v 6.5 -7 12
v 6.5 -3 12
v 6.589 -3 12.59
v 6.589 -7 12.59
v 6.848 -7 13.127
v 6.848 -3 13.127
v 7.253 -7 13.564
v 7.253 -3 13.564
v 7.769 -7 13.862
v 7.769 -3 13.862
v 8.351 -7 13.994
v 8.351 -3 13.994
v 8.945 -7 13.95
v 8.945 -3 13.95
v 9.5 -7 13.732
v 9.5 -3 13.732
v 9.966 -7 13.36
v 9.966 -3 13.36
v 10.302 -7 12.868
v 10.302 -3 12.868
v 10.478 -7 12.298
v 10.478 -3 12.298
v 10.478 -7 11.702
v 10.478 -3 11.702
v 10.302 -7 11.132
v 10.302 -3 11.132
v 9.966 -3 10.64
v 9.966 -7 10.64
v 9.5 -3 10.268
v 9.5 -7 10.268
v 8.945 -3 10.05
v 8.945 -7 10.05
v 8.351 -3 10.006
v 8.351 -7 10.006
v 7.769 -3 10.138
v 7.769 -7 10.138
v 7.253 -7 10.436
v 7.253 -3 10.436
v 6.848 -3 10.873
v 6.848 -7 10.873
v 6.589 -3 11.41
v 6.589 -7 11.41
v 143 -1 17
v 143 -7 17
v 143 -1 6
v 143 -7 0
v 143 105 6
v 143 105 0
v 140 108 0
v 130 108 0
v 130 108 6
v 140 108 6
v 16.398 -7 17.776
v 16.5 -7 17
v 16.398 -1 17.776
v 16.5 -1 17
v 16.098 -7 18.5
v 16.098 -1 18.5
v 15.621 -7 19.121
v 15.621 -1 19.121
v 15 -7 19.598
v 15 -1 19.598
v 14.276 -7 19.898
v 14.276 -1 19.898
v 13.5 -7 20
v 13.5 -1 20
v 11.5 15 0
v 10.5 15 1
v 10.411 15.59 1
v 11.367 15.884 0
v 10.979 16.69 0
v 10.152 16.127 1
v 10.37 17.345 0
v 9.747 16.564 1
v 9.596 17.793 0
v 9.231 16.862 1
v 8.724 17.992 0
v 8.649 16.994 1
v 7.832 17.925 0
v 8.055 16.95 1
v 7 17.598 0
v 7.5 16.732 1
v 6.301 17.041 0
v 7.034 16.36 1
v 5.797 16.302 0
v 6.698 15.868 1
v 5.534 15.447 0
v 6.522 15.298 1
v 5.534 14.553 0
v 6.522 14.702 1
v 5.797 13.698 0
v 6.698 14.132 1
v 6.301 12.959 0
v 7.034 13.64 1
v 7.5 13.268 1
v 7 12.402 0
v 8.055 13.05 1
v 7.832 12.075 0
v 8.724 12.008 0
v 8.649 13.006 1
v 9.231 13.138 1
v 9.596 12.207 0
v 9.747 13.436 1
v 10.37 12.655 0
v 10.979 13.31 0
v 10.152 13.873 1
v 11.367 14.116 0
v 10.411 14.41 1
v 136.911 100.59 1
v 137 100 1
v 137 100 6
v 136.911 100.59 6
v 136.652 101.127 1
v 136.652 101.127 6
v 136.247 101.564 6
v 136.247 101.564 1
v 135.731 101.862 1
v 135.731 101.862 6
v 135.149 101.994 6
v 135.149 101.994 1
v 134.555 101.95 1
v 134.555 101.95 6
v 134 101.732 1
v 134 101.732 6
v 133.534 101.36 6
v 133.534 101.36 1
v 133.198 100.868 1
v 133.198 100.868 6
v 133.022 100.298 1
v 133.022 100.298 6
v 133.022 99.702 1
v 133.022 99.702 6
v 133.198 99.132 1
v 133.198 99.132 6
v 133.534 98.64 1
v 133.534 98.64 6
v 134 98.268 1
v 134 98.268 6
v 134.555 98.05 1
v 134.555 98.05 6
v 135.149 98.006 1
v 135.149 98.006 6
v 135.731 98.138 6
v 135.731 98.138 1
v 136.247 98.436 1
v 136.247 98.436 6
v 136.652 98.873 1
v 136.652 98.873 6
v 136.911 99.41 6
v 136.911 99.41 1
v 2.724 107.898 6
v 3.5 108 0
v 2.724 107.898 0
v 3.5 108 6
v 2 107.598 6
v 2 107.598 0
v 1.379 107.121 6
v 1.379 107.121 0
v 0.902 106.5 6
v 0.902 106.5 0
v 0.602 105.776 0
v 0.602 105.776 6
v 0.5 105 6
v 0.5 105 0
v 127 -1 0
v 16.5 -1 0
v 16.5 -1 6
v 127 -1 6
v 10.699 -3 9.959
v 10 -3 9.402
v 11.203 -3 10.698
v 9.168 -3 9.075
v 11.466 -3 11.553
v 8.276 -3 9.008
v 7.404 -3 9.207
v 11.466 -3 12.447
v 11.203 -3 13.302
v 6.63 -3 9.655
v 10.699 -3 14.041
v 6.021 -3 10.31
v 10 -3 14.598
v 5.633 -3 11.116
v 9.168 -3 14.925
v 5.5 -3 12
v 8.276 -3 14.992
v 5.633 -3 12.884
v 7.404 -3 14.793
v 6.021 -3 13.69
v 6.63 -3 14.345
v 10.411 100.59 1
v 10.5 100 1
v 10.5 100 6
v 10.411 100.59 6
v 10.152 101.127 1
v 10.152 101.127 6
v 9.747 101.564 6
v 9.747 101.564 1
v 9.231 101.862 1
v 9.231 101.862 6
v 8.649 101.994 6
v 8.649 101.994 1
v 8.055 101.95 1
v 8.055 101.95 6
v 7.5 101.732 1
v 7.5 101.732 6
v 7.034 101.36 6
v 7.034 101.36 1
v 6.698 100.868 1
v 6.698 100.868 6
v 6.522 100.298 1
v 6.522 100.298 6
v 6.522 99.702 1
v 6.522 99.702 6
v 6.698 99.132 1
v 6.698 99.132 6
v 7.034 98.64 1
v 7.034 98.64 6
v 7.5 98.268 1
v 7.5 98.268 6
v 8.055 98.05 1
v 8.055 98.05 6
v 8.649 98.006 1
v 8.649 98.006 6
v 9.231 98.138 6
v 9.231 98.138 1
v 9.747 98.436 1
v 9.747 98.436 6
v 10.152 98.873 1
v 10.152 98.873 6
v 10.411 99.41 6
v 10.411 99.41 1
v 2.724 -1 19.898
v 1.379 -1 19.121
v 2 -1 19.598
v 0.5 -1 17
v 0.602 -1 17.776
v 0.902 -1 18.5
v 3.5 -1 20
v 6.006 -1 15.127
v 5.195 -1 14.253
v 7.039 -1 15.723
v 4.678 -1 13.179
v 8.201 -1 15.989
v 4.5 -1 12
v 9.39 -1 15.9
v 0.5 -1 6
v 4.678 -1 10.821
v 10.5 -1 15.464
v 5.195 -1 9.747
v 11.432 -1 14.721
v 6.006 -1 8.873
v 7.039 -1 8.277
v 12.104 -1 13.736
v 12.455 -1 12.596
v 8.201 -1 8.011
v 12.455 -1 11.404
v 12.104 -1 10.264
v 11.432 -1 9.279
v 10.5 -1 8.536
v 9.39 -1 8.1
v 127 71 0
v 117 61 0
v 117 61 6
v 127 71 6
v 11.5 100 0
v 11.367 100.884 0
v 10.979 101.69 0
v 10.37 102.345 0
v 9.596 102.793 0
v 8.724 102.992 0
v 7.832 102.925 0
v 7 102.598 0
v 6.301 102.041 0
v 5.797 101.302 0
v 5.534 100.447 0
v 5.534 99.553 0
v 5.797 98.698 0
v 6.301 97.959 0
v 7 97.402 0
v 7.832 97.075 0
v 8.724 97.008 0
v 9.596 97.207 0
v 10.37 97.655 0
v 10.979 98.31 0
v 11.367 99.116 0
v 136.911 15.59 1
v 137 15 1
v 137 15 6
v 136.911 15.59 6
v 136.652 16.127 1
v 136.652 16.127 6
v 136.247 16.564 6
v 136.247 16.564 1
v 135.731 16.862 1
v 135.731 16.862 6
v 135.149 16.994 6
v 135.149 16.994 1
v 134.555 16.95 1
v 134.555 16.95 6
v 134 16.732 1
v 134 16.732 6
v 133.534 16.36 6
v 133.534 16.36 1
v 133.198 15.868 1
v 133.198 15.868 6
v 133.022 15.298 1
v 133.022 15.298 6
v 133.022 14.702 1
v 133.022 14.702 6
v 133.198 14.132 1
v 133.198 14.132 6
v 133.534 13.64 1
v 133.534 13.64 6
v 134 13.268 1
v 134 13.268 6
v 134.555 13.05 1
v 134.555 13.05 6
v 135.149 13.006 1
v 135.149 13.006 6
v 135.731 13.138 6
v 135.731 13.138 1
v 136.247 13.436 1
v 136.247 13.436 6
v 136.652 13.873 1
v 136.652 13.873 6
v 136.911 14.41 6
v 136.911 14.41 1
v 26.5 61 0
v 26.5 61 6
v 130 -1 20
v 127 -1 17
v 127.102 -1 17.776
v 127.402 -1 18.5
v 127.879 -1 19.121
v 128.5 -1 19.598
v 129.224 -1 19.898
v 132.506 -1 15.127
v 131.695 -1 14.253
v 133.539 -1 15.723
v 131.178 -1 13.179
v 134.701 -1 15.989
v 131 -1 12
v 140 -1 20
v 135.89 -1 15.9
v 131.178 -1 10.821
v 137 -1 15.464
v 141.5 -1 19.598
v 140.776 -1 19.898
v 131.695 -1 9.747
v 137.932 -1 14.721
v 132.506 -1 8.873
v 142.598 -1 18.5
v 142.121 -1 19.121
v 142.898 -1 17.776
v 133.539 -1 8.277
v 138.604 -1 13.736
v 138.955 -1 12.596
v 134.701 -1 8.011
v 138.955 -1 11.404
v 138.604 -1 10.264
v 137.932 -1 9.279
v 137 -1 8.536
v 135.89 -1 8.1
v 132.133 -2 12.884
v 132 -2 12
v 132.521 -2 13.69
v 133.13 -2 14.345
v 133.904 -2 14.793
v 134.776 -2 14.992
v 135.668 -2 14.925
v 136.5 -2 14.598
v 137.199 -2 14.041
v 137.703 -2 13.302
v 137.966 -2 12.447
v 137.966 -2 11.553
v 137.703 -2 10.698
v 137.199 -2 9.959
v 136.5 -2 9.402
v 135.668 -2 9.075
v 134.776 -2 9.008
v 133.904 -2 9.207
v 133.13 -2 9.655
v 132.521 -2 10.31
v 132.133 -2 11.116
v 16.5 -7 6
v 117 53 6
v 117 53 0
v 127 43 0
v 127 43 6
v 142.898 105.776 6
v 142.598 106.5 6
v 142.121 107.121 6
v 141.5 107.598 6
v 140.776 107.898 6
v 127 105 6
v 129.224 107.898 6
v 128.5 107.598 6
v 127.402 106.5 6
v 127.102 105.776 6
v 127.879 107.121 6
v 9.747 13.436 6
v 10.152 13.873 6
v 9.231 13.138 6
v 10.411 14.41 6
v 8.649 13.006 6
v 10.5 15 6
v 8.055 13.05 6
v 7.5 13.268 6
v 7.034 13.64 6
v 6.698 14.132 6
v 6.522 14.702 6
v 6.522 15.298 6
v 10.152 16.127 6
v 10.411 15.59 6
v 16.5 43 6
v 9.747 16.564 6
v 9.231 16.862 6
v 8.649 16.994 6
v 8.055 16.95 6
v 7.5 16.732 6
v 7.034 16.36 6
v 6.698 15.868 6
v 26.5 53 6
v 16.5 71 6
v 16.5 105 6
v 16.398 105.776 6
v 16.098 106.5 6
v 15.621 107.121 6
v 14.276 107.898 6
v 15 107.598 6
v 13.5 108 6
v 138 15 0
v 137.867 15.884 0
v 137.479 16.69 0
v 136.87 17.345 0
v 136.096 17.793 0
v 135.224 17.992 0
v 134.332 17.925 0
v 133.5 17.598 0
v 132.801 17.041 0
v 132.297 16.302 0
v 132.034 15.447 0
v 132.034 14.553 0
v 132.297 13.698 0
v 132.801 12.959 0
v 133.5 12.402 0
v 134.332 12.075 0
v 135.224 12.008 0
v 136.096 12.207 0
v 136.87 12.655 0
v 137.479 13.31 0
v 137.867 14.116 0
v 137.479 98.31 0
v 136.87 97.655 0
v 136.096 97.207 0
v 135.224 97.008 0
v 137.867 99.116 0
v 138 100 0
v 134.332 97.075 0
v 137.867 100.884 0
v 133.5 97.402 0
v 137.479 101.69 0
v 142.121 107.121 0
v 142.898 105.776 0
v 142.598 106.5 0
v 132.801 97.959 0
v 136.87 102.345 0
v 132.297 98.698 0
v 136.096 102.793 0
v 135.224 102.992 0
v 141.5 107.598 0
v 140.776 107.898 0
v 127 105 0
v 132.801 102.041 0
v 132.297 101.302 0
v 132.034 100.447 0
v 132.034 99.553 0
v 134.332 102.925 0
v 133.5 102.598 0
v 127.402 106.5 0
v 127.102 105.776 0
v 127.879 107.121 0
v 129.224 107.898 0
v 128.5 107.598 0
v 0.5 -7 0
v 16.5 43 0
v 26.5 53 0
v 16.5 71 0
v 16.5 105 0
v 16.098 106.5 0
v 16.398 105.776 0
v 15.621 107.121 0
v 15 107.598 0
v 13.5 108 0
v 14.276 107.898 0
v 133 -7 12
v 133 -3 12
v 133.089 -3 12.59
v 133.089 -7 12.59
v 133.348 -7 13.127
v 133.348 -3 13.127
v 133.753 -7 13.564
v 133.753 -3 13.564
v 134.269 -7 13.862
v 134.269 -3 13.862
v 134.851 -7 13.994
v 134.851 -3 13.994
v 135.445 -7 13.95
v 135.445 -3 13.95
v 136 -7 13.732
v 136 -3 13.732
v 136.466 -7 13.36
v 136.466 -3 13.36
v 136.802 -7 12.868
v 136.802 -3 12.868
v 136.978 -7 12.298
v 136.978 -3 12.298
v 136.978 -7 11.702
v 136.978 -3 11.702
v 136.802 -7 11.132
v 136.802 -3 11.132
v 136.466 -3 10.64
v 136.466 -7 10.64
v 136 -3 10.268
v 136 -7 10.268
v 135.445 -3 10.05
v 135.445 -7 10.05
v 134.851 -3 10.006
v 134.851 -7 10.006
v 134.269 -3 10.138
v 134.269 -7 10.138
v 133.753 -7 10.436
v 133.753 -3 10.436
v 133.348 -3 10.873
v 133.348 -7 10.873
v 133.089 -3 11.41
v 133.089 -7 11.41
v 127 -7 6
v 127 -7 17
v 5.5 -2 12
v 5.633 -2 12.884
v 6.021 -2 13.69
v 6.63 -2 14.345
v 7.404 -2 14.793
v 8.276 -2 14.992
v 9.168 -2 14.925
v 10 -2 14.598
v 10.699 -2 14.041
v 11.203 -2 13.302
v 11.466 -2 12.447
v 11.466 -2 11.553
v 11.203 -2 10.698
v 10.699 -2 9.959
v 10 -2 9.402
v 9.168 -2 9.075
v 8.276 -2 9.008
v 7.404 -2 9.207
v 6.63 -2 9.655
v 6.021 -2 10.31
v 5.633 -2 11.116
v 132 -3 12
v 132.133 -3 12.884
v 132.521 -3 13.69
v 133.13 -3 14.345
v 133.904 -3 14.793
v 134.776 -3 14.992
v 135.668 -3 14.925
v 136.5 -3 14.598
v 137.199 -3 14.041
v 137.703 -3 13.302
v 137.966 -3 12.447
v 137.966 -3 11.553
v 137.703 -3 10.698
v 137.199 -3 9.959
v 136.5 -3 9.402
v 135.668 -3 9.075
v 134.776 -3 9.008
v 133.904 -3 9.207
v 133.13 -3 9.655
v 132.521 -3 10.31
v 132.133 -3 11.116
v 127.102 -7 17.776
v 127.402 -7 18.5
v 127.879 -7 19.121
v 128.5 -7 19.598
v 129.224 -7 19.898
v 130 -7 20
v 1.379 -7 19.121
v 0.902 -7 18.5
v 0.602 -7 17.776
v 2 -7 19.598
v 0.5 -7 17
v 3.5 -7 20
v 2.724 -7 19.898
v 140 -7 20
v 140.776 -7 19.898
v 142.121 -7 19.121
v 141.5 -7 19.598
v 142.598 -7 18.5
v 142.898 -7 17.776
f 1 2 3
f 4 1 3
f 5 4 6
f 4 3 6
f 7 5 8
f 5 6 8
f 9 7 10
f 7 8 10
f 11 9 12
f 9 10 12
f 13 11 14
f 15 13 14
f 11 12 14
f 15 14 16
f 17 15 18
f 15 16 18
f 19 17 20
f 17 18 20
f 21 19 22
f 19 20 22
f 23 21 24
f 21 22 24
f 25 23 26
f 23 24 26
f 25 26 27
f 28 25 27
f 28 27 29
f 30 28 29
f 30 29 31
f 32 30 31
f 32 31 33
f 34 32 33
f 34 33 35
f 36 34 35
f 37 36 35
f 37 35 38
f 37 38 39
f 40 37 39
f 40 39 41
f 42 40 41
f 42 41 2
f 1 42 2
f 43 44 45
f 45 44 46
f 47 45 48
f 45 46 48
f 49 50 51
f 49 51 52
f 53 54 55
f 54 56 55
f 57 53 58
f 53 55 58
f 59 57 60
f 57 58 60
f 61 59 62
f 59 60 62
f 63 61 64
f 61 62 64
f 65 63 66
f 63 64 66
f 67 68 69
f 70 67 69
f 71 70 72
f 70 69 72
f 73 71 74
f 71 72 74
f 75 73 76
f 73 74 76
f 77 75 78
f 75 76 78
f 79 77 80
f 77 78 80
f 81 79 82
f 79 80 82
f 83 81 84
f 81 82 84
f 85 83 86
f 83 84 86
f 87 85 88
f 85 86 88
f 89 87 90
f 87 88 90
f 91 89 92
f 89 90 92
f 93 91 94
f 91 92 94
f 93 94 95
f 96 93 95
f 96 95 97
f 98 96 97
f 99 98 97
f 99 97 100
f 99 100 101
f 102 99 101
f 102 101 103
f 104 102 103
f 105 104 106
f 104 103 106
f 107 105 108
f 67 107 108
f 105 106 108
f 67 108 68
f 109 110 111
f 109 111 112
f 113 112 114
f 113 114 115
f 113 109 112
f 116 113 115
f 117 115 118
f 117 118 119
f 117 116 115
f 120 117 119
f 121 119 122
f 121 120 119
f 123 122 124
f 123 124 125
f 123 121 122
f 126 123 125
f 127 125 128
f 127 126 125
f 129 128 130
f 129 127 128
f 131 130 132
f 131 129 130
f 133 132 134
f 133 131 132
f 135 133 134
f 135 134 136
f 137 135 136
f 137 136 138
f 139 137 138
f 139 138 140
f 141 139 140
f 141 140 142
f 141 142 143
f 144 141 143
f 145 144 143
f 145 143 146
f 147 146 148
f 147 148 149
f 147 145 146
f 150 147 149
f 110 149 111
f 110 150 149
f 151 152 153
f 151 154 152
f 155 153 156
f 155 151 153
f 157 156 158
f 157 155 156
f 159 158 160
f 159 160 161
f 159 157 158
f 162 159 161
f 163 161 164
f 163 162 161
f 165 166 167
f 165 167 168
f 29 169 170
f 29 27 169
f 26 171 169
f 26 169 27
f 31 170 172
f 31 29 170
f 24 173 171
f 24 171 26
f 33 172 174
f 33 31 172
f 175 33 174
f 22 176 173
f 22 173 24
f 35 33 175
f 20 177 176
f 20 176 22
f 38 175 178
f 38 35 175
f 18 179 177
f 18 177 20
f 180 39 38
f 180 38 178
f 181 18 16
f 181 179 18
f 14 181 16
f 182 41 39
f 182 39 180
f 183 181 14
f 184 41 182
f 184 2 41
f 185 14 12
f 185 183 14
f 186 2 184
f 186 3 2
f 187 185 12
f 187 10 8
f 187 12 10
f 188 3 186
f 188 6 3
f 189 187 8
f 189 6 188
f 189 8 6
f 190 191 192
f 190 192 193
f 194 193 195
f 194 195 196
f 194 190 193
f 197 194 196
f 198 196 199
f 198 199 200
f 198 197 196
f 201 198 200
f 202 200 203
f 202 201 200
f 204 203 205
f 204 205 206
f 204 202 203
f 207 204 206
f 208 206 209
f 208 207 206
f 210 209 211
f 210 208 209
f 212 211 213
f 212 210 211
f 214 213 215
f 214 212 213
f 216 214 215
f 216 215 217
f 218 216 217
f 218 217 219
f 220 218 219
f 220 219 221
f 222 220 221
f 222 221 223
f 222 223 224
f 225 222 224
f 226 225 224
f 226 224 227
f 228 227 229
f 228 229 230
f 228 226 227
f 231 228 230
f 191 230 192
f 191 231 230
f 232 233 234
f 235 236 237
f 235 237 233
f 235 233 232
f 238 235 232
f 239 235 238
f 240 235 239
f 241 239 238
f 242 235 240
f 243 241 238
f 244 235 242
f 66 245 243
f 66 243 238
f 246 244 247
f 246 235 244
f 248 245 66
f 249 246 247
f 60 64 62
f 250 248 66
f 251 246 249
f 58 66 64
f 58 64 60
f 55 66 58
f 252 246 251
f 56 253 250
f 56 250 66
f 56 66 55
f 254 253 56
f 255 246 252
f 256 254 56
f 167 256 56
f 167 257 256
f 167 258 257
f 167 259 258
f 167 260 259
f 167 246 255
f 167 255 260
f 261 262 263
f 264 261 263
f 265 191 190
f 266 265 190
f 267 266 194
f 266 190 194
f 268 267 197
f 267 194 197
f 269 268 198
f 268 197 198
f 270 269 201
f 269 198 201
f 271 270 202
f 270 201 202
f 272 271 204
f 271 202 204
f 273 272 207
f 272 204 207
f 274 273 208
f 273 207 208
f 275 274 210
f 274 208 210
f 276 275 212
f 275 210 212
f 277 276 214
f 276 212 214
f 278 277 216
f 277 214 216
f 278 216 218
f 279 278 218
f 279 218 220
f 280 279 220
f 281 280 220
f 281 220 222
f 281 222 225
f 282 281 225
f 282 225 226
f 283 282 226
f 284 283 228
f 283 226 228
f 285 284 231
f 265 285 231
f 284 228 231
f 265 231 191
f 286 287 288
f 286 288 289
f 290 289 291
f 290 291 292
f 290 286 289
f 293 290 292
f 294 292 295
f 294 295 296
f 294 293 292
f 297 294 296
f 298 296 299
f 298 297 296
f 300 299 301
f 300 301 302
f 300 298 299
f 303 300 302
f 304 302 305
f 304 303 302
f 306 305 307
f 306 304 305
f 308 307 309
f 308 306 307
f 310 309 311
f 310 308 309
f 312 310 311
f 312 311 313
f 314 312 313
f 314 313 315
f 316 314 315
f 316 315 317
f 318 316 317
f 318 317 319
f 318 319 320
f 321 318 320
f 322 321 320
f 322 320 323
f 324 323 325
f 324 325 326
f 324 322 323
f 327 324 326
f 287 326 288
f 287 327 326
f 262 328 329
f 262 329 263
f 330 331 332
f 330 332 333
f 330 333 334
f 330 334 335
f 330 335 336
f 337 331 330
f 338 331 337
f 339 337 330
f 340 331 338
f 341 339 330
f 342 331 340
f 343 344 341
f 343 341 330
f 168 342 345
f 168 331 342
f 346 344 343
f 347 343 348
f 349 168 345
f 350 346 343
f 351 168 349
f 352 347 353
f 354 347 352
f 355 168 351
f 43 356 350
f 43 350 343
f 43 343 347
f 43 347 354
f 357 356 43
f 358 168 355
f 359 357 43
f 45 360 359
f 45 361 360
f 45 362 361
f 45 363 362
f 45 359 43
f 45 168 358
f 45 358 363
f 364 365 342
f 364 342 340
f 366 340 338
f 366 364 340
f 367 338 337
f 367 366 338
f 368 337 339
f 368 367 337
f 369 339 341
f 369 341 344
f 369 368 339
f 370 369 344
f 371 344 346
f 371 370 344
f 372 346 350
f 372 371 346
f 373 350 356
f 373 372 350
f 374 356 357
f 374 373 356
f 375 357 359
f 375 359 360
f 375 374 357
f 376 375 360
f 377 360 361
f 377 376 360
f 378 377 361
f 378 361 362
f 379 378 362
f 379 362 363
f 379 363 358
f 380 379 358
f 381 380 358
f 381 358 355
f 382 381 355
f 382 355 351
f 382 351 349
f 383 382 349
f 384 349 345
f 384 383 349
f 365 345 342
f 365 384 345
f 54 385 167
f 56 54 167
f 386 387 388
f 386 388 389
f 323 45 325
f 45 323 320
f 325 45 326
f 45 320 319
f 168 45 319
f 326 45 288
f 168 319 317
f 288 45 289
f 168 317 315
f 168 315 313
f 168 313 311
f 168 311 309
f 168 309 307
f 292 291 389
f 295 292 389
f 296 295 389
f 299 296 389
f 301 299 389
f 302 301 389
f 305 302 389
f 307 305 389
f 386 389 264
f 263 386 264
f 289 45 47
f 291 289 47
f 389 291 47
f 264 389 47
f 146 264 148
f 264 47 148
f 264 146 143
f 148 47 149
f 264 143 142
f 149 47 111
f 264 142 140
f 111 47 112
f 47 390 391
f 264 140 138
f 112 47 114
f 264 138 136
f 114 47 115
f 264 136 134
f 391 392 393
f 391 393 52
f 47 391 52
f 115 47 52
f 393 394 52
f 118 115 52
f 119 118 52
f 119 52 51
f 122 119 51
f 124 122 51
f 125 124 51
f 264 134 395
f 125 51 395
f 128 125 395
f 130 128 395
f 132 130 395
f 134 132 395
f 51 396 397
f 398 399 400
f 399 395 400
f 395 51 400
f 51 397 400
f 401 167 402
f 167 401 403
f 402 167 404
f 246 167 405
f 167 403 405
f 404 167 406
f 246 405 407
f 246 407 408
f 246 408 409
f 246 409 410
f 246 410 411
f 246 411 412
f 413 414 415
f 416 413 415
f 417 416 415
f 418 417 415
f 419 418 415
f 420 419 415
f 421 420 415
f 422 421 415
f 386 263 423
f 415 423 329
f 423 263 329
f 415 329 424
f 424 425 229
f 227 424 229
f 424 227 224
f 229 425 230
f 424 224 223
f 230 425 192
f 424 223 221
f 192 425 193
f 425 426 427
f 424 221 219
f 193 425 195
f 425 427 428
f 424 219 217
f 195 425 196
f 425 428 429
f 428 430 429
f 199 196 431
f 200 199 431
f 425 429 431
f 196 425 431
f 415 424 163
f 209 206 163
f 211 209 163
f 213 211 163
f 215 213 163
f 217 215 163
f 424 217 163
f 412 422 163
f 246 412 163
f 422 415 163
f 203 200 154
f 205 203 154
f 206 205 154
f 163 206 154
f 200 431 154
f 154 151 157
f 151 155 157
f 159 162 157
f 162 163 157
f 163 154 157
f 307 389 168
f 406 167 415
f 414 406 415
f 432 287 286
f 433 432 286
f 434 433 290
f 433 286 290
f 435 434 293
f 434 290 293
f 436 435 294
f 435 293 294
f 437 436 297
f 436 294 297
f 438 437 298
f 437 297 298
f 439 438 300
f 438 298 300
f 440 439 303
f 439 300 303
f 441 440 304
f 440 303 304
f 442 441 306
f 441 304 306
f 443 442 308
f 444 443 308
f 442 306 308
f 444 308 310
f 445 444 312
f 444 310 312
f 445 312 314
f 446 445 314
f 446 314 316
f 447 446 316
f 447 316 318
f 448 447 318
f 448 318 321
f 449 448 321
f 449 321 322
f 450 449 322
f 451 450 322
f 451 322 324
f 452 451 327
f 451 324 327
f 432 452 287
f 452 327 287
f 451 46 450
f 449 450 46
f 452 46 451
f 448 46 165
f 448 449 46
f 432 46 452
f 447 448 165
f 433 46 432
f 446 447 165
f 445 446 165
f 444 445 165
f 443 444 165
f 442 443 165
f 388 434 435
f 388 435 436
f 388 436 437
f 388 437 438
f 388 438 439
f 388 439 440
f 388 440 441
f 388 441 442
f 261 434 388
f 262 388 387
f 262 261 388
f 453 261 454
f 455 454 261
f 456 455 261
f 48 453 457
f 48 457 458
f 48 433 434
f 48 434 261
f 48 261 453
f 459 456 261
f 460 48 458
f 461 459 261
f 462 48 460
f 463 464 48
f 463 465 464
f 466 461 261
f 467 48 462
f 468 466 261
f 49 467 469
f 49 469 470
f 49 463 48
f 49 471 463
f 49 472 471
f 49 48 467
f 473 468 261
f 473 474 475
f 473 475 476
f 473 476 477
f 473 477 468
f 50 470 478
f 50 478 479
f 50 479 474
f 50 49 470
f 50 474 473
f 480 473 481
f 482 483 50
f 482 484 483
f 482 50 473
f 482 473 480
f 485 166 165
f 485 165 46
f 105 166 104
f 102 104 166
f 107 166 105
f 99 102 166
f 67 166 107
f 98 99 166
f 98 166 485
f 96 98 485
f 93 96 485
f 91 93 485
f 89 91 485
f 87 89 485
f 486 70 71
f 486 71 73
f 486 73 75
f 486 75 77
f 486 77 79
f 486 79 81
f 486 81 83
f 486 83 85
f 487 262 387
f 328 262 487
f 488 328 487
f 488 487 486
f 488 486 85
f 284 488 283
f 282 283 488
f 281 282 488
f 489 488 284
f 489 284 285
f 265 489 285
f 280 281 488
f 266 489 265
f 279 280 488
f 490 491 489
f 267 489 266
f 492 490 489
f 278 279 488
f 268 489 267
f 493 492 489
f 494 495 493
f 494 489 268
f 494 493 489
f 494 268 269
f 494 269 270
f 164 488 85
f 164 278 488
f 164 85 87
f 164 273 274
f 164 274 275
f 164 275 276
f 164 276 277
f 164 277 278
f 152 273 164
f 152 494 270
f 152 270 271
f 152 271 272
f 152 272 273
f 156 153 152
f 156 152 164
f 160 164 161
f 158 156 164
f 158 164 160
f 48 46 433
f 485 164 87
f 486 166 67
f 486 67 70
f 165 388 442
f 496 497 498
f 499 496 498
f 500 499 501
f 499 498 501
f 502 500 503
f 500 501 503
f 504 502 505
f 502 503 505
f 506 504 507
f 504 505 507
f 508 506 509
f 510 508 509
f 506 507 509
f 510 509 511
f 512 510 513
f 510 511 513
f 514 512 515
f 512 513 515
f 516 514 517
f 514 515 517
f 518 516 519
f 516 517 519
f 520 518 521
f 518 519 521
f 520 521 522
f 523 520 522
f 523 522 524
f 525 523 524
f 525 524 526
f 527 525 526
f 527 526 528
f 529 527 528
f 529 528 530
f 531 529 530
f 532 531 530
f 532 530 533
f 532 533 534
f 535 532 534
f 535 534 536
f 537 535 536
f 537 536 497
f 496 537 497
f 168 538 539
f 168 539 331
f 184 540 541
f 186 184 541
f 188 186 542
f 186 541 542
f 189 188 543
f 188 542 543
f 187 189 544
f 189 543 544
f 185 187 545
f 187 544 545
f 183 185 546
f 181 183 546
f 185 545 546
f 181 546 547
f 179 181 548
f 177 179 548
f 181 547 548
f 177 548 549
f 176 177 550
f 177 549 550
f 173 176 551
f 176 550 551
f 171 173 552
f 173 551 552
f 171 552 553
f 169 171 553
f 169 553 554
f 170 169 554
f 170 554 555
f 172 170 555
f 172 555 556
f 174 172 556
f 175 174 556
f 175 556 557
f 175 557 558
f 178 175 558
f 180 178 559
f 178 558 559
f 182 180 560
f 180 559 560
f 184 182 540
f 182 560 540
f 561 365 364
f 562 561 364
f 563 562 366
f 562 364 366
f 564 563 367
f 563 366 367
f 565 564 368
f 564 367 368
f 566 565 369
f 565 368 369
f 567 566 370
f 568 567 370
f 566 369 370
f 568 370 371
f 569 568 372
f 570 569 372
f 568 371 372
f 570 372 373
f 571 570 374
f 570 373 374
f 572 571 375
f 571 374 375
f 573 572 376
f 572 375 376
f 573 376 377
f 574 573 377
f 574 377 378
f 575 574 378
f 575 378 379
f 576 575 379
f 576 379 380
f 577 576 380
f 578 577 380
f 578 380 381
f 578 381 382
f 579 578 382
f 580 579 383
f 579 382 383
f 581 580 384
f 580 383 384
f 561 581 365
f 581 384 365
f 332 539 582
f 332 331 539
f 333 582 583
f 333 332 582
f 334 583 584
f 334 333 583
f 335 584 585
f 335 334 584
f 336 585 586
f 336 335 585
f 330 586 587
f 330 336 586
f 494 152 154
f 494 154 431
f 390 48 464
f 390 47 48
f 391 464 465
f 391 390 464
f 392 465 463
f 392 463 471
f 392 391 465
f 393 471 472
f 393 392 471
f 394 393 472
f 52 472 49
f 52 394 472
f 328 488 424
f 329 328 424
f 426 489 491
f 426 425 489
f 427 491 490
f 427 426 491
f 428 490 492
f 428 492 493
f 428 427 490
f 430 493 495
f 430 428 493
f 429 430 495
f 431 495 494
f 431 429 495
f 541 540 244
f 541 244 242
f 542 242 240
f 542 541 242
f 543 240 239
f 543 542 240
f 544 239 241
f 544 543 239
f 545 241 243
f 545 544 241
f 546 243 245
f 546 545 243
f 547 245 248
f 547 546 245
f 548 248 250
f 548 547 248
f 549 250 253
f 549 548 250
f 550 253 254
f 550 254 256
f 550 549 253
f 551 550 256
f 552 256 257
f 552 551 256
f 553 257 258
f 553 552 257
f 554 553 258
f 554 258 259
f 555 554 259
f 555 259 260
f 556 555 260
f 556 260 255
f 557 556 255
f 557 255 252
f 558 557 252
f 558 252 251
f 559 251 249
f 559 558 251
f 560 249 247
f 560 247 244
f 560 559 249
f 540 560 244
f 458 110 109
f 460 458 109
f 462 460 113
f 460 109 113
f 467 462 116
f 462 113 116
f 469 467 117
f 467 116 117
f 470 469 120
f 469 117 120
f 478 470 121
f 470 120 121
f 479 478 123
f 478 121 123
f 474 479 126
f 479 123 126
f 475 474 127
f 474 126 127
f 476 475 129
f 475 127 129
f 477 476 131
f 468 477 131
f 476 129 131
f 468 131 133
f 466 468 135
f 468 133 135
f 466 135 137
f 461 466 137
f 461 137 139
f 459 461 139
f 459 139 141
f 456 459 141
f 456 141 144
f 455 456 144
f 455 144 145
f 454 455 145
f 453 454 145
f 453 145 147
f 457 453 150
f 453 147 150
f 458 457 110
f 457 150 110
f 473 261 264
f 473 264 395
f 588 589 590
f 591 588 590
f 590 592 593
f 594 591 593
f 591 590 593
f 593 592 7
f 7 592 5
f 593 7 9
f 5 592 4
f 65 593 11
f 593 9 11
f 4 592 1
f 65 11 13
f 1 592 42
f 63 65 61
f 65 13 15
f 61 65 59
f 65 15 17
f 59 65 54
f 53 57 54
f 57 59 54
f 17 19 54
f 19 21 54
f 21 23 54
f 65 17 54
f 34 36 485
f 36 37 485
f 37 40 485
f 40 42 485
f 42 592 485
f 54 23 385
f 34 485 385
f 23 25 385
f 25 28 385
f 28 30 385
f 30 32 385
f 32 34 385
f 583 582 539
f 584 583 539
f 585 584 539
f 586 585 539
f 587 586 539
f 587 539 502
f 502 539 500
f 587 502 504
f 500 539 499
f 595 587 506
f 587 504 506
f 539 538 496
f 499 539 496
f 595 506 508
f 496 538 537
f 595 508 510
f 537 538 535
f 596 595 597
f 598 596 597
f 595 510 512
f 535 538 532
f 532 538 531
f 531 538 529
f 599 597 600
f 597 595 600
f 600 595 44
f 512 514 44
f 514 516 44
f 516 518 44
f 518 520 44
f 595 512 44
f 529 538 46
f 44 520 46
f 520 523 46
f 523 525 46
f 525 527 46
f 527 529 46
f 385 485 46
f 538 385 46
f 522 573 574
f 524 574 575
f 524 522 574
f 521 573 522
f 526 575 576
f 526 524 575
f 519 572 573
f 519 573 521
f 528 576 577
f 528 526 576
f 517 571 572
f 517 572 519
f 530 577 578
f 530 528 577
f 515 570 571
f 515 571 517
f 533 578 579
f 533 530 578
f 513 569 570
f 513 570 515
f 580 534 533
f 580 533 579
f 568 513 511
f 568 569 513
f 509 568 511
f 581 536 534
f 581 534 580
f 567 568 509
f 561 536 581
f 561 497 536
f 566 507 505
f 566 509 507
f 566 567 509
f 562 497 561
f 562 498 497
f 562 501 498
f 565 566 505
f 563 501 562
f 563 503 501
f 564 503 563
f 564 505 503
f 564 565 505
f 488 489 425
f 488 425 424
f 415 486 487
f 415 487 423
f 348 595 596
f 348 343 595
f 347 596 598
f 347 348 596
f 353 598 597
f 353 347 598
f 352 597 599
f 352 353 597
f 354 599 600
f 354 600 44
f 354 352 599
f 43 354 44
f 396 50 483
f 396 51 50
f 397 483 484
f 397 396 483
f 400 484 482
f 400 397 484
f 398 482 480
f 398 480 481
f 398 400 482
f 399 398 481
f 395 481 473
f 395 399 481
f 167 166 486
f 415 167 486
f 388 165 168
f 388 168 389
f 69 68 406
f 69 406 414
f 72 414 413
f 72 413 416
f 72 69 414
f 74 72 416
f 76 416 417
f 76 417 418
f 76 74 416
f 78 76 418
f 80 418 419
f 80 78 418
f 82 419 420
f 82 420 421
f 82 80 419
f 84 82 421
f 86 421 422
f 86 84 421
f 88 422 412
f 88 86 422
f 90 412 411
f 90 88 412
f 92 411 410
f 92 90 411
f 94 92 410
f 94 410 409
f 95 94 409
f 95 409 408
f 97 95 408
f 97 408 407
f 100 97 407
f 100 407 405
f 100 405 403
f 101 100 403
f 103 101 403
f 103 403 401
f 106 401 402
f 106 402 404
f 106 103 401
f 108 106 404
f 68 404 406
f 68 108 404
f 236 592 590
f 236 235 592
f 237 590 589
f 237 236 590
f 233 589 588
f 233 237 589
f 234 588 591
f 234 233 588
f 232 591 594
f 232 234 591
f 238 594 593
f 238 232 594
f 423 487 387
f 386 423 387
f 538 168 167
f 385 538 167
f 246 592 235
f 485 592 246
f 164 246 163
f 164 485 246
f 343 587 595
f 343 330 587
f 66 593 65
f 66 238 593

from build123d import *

# Parameters (mm, degrees)
SKETCH_R        = 2
SKETCH_W        = 110.5
SKETCH_H        = 54
PAD_DEPTH       = 6
SKETCH001_W     = 16
SKETCH001_H     = 6
PAD001_DEPTH    = 14
SKETCH002_R     = 2
HOLE_DEPTH      = 24
SKETCH003_R     = 3
POCKET_DEPTH    = 2
CHAMFER_SIZE    = 1
CHAMFER001_SIZE = 1
FILLET_R        = 3
CHAMFER002_SIZE = 10


with BuildPart() as part:
    # Sketch → Pad (new body)
    with BuildSketch(Plane.XY):
        Polygon((143, -7), (0.5, -7), (0.5, 108), (16.5, 108), (16.5, 61), (127, 61), (127, 108), (143, 108), align=None)
        with Locations((8.5, 15)):
            Circle(SKETCH_R, mode=Mode.SUBTRACT)
        with Locations((8.5, 100)):
            Circle(SKETCH_R, mode=Mode.SUBTRACT)
        with Locations((135, 15)):
            Circle(SKETCH_R, mode=Mode.SUBTRACT)
        with Locations((135, 100)):
            Circle(SKETCH_R, mode=Mode.SUBTRACT)
        with Locations((71.75, 26)):
            Rectangle(SKETCH_W, SKETCH_H, mode=Mode.SUBTRACT)
    extrude(amount=PAD_DEPTH)

    # Sketch001 (on Face18 of Pad) → Pad001 (join)
    with BuildSketch(Plane.XY.offset(6)):
        with Locations((135, -4)):
            Rectangle(SKETCH001_W, SKETCH001_H)
        with Locations((8.5, -4)):
            Rectangle(SKETCH001_W, SKETCH001_H)
    extrude(amount=PAD001_DEPTH)

    # Sketch002 (on DatumPlane) → Hole (cut)
    with BuildSketch(Plane(origin=(0, -1, 0), x_dir=(-1, 0, 0), z_dir=(0, 1, 0))):
        with Locations((-135, 12)):
            Circle(SKETCH002_R)
        with Locations((-8.5, 12)):
            Circle(SKETCH002_R)
    extrude(amount=-HOLE_DEPTH, mode=Mode.SUBTRACT)

    # Sketch003 (on Face20 of Hole) → Pocket (cut)
    with BuildSketch(Plane(origin=(0, -1, 0), x_dir=(-1, 0, 0), z_dir=(0, 1, 0))):
        with Locations((-135, 12)):
            Circle(SKETCH003_R)
        with Locations((-8.5, 12)):
            Circle(SKETCH003_R)
    extrude(amount=-POCKET_DEPTH, mode=Mode.SUBTRACT)

    # Chamfer
    chamfer_edges = [part.edges().sort_by_distance(p)[0] for p in [
        (6.5, 15, 0),
        (6.5, 100, 0),
        (133, 15, 0),
        (133, 100, 0),
    ]]
    chamfer(chamfer_edges, length=CHAMFER_SIZE)

    # Chamfer001
    chamfer001_edges = [part.edges().sort_by_distance(p)[0] for p in [
        (11.5, -1, 12),
        (138, -1, 12),
    ]]
    chamfer(chamfer001_edges, length=CHAMFER001_SIZE)

    # Fillet
    fillet_edges = [part.edges().sort_by_distance(p)[0] for p in [
        (0.5, 108, 3),
        (16.5, 108, 3),
        (127, 108, 3),
        (143, 108, 3),
        (0.5, -4, 20),
        (16.5, -4, 20),
        (127, -4, 20),
        (143, -4, 20),
    ]]
    fillet(fillet_edges, radius=FILLET_R)

    # Chamfer002
    chamfer002_edges = [part.edges().sort_by_distance(p)[0] for p in [
        (16.5, 61, 3),
        (16.5, 53, 3),
        (127, 61, 3),
        (127, 53, 3),
    ]]
    chamfer(chamfer002_edges, length=CHAMFER002_SIZE)


solid = part.part
